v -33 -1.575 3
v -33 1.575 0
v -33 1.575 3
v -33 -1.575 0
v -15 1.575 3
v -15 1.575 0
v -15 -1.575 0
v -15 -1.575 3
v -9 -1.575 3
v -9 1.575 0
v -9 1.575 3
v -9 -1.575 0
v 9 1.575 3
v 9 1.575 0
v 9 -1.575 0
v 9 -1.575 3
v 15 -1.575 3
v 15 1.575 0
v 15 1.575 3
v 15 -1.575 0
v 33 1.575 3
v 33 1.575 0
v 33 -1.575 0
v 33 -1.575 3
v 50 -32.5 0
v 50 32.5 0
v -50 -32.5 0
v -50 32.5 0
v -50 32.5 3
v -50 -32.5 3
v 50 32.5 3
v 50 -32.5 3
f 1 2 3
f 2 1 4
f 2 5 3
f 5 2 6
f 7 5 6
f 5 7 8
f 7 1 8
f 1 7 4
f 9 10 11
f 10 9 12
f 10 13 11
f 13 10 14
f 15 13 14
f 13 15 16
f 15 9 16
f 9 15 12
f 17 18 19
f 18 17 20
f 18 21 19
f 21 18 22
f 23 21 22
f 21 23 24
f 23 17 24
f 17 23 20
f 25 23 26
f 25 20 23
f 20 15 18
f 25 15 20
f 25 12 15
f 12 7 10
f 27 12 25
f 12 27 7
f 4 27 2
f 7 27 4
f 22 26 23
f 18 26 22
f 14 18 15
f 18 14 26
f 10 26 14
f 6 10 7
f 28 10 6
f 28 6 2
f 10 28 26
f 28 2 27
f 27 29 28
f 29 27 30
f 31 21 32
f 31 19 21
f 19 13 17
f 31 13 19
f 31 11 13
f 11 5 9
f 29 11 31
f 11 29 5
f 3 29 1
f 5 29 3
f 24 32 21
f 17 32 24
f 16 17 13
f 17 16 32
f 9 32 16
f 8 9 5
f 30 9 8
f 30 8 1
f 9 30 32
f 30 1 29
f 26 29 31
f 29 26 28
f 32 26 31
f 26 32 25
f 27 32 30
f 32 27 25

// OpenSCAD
material_thickness_mm = 3.0;
kerf_mm = 0.2;

panel_width_mm = 100;
panel_height_mm = 65;

slot_count = 3;
slot_length_mm = 18;
slot_width_mm = 3.15;
min_web_mm = 6.0;

slot_pitch_mm = slot_length_mm + min_web_mm;

echo(str(
    "MAKERBENCH-LASER2D: {\"material_thickness_mm\": ", material_thickness_mm,
    ", \"kerf_mm\": ", kerf_mm,
    ", \"slot_count\": ", slot_count,
    ", \"slot_length_mm\": ", slot_length_mm,
    ", \"slot_width_mm\": ", slot_width_mm,
    ", \"min_web_mm\": ", min_web_mm,
    "}"
));

module panel_with_slots() {
    difference() {
        linear_extrude(height = material_thickness_mm)
            square([panel_width_mm, panel_height_mm], center = true);

        for (i = [-(slot_count - 1) / 2 : 1 : (slot_count - 1) / 2]) {
            translate([i * slot_pitch_mm, 0, -0.1])
                linear_extrude(height = material_thickness_mm + 0.2)
                    square([slot_length_mm, slot_width_mm], center = true);
        }
    }
}

panel_with_slots();
